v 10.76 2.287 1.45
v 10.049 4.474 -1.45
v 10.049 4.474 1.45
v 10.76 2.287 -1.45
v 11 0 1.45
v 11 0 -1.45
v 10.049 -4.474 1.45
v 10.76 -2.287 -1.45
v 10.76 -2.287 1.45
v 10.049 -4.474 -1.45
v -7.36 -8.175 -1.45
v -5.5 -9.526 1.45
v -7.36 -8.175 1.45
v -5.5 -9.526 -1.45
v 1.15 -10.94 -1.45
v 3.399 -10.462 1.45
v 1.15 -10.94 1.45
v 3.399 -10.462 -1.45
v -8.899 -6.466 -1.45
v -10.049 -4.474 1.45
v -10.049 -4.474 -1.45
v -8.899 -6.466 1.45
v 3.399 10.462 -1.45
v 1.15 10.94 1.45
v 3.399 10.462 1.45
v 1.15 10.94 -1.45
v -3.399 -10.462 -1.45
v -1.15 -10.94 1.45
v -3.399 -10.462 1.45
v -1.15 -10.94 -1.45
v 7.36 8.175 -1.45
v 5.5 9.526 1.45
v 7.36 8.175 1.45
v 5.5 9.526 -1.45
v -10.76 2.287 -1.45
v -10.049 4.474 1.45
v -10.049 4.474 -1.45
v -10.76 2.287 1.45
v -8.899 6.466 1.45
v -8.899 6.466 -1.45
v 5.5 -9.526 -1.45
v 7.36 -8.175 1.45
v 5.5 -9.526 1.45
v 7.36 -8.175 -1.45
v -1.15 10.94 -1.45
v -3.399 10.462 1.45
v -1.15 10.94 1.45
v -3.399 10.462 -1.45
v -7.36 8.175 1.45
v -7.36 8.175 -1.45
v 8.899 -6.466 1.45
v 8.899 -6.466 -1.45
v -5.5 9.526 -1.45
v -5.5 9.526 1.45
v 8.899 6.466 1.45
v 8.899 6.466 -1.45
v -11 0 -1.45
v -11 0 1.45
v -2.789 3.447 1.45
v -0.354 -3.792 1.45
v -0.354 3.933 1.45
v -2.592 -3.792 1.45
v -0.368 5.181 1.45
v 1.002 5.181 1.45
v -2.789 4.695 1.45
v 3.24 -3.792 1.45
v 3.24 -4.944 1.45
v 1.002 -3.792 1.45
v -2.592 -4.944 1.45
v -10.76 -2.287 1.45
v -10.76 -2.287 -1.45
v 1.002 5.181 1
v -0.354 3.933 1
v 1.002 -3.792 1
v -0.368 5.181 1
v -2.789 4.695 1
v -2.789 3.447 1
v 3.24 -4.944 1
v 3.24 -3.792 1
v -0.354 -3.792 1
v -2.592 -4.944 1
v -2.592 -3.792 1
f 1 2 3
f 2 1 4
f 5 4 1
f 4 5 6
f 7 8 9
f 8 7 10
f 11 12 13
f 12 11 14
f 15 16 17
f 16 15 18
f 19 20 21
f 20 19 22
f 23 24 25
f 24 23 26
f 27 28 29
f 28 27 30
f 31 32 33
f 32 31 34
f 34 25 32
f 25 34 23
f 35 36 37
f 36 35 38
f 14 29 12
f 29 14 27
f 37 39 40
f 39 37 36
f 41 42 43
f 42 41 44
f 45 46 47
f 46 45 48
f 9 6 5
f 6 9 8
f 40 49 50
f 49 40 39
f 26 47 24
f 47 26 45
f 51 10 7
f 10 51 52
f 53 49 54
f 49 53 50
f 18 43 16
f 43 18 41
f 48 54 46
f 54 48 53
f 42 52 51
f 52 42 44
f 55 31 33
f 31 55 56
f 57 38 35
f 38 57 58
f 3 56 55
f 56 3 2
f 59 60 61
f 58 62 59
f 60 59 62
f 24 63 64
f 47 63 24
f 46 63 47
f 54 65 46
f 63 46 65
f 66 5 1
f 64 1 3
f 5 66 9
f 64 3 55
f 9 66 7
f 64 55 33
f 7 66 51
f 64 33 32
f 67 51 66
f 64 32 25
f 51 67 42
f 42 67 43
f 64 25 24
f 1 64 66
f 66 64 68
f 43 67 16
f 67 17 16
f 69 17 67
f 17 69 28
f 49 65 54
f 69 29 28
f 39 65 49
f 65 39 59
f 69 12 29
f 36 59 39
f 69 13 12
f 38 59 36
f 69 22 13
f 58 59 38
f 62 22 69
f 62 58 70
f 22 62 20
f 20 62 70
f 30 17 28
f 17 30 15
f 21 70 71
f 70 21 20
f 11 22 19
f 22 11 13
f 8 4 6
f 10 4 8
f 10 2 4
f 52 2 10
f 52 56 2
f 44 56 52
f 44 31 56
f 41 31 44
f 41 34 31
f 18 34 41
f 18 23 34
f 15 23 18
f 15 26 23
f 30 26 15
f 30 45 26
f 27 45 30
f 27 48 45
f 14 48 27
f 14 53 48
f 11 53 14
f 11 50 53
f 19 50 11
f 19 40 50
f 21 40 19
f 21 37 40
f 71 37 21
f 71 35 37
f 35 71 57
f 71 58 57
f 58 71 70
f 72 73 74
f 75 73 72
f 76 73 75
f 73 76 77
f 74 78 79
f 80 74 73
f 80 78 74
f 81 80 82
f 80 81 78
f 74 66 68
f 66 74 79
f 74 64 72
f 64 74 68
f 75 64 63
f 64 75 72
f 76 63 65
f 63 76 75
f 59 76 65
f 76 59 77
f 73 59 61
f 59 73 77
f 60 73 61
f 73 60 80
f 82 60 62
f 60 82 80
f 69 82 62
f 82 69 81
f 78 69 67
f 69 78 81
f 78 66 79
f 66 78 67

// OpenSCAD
module coin() {
  difference() {
    
cylinder(h=2.9,d=22,center=true);
    translate([0,0,1])

    linear_extrude(1)
      text("1",10,"Courier Bold",halign="center",valign="center");
  }
}

/*
for(i=[0:3]){
  for(j=[0:3]){
    translate([24*i,24*j,0])
    coin();
  }
}
*/

coin();
